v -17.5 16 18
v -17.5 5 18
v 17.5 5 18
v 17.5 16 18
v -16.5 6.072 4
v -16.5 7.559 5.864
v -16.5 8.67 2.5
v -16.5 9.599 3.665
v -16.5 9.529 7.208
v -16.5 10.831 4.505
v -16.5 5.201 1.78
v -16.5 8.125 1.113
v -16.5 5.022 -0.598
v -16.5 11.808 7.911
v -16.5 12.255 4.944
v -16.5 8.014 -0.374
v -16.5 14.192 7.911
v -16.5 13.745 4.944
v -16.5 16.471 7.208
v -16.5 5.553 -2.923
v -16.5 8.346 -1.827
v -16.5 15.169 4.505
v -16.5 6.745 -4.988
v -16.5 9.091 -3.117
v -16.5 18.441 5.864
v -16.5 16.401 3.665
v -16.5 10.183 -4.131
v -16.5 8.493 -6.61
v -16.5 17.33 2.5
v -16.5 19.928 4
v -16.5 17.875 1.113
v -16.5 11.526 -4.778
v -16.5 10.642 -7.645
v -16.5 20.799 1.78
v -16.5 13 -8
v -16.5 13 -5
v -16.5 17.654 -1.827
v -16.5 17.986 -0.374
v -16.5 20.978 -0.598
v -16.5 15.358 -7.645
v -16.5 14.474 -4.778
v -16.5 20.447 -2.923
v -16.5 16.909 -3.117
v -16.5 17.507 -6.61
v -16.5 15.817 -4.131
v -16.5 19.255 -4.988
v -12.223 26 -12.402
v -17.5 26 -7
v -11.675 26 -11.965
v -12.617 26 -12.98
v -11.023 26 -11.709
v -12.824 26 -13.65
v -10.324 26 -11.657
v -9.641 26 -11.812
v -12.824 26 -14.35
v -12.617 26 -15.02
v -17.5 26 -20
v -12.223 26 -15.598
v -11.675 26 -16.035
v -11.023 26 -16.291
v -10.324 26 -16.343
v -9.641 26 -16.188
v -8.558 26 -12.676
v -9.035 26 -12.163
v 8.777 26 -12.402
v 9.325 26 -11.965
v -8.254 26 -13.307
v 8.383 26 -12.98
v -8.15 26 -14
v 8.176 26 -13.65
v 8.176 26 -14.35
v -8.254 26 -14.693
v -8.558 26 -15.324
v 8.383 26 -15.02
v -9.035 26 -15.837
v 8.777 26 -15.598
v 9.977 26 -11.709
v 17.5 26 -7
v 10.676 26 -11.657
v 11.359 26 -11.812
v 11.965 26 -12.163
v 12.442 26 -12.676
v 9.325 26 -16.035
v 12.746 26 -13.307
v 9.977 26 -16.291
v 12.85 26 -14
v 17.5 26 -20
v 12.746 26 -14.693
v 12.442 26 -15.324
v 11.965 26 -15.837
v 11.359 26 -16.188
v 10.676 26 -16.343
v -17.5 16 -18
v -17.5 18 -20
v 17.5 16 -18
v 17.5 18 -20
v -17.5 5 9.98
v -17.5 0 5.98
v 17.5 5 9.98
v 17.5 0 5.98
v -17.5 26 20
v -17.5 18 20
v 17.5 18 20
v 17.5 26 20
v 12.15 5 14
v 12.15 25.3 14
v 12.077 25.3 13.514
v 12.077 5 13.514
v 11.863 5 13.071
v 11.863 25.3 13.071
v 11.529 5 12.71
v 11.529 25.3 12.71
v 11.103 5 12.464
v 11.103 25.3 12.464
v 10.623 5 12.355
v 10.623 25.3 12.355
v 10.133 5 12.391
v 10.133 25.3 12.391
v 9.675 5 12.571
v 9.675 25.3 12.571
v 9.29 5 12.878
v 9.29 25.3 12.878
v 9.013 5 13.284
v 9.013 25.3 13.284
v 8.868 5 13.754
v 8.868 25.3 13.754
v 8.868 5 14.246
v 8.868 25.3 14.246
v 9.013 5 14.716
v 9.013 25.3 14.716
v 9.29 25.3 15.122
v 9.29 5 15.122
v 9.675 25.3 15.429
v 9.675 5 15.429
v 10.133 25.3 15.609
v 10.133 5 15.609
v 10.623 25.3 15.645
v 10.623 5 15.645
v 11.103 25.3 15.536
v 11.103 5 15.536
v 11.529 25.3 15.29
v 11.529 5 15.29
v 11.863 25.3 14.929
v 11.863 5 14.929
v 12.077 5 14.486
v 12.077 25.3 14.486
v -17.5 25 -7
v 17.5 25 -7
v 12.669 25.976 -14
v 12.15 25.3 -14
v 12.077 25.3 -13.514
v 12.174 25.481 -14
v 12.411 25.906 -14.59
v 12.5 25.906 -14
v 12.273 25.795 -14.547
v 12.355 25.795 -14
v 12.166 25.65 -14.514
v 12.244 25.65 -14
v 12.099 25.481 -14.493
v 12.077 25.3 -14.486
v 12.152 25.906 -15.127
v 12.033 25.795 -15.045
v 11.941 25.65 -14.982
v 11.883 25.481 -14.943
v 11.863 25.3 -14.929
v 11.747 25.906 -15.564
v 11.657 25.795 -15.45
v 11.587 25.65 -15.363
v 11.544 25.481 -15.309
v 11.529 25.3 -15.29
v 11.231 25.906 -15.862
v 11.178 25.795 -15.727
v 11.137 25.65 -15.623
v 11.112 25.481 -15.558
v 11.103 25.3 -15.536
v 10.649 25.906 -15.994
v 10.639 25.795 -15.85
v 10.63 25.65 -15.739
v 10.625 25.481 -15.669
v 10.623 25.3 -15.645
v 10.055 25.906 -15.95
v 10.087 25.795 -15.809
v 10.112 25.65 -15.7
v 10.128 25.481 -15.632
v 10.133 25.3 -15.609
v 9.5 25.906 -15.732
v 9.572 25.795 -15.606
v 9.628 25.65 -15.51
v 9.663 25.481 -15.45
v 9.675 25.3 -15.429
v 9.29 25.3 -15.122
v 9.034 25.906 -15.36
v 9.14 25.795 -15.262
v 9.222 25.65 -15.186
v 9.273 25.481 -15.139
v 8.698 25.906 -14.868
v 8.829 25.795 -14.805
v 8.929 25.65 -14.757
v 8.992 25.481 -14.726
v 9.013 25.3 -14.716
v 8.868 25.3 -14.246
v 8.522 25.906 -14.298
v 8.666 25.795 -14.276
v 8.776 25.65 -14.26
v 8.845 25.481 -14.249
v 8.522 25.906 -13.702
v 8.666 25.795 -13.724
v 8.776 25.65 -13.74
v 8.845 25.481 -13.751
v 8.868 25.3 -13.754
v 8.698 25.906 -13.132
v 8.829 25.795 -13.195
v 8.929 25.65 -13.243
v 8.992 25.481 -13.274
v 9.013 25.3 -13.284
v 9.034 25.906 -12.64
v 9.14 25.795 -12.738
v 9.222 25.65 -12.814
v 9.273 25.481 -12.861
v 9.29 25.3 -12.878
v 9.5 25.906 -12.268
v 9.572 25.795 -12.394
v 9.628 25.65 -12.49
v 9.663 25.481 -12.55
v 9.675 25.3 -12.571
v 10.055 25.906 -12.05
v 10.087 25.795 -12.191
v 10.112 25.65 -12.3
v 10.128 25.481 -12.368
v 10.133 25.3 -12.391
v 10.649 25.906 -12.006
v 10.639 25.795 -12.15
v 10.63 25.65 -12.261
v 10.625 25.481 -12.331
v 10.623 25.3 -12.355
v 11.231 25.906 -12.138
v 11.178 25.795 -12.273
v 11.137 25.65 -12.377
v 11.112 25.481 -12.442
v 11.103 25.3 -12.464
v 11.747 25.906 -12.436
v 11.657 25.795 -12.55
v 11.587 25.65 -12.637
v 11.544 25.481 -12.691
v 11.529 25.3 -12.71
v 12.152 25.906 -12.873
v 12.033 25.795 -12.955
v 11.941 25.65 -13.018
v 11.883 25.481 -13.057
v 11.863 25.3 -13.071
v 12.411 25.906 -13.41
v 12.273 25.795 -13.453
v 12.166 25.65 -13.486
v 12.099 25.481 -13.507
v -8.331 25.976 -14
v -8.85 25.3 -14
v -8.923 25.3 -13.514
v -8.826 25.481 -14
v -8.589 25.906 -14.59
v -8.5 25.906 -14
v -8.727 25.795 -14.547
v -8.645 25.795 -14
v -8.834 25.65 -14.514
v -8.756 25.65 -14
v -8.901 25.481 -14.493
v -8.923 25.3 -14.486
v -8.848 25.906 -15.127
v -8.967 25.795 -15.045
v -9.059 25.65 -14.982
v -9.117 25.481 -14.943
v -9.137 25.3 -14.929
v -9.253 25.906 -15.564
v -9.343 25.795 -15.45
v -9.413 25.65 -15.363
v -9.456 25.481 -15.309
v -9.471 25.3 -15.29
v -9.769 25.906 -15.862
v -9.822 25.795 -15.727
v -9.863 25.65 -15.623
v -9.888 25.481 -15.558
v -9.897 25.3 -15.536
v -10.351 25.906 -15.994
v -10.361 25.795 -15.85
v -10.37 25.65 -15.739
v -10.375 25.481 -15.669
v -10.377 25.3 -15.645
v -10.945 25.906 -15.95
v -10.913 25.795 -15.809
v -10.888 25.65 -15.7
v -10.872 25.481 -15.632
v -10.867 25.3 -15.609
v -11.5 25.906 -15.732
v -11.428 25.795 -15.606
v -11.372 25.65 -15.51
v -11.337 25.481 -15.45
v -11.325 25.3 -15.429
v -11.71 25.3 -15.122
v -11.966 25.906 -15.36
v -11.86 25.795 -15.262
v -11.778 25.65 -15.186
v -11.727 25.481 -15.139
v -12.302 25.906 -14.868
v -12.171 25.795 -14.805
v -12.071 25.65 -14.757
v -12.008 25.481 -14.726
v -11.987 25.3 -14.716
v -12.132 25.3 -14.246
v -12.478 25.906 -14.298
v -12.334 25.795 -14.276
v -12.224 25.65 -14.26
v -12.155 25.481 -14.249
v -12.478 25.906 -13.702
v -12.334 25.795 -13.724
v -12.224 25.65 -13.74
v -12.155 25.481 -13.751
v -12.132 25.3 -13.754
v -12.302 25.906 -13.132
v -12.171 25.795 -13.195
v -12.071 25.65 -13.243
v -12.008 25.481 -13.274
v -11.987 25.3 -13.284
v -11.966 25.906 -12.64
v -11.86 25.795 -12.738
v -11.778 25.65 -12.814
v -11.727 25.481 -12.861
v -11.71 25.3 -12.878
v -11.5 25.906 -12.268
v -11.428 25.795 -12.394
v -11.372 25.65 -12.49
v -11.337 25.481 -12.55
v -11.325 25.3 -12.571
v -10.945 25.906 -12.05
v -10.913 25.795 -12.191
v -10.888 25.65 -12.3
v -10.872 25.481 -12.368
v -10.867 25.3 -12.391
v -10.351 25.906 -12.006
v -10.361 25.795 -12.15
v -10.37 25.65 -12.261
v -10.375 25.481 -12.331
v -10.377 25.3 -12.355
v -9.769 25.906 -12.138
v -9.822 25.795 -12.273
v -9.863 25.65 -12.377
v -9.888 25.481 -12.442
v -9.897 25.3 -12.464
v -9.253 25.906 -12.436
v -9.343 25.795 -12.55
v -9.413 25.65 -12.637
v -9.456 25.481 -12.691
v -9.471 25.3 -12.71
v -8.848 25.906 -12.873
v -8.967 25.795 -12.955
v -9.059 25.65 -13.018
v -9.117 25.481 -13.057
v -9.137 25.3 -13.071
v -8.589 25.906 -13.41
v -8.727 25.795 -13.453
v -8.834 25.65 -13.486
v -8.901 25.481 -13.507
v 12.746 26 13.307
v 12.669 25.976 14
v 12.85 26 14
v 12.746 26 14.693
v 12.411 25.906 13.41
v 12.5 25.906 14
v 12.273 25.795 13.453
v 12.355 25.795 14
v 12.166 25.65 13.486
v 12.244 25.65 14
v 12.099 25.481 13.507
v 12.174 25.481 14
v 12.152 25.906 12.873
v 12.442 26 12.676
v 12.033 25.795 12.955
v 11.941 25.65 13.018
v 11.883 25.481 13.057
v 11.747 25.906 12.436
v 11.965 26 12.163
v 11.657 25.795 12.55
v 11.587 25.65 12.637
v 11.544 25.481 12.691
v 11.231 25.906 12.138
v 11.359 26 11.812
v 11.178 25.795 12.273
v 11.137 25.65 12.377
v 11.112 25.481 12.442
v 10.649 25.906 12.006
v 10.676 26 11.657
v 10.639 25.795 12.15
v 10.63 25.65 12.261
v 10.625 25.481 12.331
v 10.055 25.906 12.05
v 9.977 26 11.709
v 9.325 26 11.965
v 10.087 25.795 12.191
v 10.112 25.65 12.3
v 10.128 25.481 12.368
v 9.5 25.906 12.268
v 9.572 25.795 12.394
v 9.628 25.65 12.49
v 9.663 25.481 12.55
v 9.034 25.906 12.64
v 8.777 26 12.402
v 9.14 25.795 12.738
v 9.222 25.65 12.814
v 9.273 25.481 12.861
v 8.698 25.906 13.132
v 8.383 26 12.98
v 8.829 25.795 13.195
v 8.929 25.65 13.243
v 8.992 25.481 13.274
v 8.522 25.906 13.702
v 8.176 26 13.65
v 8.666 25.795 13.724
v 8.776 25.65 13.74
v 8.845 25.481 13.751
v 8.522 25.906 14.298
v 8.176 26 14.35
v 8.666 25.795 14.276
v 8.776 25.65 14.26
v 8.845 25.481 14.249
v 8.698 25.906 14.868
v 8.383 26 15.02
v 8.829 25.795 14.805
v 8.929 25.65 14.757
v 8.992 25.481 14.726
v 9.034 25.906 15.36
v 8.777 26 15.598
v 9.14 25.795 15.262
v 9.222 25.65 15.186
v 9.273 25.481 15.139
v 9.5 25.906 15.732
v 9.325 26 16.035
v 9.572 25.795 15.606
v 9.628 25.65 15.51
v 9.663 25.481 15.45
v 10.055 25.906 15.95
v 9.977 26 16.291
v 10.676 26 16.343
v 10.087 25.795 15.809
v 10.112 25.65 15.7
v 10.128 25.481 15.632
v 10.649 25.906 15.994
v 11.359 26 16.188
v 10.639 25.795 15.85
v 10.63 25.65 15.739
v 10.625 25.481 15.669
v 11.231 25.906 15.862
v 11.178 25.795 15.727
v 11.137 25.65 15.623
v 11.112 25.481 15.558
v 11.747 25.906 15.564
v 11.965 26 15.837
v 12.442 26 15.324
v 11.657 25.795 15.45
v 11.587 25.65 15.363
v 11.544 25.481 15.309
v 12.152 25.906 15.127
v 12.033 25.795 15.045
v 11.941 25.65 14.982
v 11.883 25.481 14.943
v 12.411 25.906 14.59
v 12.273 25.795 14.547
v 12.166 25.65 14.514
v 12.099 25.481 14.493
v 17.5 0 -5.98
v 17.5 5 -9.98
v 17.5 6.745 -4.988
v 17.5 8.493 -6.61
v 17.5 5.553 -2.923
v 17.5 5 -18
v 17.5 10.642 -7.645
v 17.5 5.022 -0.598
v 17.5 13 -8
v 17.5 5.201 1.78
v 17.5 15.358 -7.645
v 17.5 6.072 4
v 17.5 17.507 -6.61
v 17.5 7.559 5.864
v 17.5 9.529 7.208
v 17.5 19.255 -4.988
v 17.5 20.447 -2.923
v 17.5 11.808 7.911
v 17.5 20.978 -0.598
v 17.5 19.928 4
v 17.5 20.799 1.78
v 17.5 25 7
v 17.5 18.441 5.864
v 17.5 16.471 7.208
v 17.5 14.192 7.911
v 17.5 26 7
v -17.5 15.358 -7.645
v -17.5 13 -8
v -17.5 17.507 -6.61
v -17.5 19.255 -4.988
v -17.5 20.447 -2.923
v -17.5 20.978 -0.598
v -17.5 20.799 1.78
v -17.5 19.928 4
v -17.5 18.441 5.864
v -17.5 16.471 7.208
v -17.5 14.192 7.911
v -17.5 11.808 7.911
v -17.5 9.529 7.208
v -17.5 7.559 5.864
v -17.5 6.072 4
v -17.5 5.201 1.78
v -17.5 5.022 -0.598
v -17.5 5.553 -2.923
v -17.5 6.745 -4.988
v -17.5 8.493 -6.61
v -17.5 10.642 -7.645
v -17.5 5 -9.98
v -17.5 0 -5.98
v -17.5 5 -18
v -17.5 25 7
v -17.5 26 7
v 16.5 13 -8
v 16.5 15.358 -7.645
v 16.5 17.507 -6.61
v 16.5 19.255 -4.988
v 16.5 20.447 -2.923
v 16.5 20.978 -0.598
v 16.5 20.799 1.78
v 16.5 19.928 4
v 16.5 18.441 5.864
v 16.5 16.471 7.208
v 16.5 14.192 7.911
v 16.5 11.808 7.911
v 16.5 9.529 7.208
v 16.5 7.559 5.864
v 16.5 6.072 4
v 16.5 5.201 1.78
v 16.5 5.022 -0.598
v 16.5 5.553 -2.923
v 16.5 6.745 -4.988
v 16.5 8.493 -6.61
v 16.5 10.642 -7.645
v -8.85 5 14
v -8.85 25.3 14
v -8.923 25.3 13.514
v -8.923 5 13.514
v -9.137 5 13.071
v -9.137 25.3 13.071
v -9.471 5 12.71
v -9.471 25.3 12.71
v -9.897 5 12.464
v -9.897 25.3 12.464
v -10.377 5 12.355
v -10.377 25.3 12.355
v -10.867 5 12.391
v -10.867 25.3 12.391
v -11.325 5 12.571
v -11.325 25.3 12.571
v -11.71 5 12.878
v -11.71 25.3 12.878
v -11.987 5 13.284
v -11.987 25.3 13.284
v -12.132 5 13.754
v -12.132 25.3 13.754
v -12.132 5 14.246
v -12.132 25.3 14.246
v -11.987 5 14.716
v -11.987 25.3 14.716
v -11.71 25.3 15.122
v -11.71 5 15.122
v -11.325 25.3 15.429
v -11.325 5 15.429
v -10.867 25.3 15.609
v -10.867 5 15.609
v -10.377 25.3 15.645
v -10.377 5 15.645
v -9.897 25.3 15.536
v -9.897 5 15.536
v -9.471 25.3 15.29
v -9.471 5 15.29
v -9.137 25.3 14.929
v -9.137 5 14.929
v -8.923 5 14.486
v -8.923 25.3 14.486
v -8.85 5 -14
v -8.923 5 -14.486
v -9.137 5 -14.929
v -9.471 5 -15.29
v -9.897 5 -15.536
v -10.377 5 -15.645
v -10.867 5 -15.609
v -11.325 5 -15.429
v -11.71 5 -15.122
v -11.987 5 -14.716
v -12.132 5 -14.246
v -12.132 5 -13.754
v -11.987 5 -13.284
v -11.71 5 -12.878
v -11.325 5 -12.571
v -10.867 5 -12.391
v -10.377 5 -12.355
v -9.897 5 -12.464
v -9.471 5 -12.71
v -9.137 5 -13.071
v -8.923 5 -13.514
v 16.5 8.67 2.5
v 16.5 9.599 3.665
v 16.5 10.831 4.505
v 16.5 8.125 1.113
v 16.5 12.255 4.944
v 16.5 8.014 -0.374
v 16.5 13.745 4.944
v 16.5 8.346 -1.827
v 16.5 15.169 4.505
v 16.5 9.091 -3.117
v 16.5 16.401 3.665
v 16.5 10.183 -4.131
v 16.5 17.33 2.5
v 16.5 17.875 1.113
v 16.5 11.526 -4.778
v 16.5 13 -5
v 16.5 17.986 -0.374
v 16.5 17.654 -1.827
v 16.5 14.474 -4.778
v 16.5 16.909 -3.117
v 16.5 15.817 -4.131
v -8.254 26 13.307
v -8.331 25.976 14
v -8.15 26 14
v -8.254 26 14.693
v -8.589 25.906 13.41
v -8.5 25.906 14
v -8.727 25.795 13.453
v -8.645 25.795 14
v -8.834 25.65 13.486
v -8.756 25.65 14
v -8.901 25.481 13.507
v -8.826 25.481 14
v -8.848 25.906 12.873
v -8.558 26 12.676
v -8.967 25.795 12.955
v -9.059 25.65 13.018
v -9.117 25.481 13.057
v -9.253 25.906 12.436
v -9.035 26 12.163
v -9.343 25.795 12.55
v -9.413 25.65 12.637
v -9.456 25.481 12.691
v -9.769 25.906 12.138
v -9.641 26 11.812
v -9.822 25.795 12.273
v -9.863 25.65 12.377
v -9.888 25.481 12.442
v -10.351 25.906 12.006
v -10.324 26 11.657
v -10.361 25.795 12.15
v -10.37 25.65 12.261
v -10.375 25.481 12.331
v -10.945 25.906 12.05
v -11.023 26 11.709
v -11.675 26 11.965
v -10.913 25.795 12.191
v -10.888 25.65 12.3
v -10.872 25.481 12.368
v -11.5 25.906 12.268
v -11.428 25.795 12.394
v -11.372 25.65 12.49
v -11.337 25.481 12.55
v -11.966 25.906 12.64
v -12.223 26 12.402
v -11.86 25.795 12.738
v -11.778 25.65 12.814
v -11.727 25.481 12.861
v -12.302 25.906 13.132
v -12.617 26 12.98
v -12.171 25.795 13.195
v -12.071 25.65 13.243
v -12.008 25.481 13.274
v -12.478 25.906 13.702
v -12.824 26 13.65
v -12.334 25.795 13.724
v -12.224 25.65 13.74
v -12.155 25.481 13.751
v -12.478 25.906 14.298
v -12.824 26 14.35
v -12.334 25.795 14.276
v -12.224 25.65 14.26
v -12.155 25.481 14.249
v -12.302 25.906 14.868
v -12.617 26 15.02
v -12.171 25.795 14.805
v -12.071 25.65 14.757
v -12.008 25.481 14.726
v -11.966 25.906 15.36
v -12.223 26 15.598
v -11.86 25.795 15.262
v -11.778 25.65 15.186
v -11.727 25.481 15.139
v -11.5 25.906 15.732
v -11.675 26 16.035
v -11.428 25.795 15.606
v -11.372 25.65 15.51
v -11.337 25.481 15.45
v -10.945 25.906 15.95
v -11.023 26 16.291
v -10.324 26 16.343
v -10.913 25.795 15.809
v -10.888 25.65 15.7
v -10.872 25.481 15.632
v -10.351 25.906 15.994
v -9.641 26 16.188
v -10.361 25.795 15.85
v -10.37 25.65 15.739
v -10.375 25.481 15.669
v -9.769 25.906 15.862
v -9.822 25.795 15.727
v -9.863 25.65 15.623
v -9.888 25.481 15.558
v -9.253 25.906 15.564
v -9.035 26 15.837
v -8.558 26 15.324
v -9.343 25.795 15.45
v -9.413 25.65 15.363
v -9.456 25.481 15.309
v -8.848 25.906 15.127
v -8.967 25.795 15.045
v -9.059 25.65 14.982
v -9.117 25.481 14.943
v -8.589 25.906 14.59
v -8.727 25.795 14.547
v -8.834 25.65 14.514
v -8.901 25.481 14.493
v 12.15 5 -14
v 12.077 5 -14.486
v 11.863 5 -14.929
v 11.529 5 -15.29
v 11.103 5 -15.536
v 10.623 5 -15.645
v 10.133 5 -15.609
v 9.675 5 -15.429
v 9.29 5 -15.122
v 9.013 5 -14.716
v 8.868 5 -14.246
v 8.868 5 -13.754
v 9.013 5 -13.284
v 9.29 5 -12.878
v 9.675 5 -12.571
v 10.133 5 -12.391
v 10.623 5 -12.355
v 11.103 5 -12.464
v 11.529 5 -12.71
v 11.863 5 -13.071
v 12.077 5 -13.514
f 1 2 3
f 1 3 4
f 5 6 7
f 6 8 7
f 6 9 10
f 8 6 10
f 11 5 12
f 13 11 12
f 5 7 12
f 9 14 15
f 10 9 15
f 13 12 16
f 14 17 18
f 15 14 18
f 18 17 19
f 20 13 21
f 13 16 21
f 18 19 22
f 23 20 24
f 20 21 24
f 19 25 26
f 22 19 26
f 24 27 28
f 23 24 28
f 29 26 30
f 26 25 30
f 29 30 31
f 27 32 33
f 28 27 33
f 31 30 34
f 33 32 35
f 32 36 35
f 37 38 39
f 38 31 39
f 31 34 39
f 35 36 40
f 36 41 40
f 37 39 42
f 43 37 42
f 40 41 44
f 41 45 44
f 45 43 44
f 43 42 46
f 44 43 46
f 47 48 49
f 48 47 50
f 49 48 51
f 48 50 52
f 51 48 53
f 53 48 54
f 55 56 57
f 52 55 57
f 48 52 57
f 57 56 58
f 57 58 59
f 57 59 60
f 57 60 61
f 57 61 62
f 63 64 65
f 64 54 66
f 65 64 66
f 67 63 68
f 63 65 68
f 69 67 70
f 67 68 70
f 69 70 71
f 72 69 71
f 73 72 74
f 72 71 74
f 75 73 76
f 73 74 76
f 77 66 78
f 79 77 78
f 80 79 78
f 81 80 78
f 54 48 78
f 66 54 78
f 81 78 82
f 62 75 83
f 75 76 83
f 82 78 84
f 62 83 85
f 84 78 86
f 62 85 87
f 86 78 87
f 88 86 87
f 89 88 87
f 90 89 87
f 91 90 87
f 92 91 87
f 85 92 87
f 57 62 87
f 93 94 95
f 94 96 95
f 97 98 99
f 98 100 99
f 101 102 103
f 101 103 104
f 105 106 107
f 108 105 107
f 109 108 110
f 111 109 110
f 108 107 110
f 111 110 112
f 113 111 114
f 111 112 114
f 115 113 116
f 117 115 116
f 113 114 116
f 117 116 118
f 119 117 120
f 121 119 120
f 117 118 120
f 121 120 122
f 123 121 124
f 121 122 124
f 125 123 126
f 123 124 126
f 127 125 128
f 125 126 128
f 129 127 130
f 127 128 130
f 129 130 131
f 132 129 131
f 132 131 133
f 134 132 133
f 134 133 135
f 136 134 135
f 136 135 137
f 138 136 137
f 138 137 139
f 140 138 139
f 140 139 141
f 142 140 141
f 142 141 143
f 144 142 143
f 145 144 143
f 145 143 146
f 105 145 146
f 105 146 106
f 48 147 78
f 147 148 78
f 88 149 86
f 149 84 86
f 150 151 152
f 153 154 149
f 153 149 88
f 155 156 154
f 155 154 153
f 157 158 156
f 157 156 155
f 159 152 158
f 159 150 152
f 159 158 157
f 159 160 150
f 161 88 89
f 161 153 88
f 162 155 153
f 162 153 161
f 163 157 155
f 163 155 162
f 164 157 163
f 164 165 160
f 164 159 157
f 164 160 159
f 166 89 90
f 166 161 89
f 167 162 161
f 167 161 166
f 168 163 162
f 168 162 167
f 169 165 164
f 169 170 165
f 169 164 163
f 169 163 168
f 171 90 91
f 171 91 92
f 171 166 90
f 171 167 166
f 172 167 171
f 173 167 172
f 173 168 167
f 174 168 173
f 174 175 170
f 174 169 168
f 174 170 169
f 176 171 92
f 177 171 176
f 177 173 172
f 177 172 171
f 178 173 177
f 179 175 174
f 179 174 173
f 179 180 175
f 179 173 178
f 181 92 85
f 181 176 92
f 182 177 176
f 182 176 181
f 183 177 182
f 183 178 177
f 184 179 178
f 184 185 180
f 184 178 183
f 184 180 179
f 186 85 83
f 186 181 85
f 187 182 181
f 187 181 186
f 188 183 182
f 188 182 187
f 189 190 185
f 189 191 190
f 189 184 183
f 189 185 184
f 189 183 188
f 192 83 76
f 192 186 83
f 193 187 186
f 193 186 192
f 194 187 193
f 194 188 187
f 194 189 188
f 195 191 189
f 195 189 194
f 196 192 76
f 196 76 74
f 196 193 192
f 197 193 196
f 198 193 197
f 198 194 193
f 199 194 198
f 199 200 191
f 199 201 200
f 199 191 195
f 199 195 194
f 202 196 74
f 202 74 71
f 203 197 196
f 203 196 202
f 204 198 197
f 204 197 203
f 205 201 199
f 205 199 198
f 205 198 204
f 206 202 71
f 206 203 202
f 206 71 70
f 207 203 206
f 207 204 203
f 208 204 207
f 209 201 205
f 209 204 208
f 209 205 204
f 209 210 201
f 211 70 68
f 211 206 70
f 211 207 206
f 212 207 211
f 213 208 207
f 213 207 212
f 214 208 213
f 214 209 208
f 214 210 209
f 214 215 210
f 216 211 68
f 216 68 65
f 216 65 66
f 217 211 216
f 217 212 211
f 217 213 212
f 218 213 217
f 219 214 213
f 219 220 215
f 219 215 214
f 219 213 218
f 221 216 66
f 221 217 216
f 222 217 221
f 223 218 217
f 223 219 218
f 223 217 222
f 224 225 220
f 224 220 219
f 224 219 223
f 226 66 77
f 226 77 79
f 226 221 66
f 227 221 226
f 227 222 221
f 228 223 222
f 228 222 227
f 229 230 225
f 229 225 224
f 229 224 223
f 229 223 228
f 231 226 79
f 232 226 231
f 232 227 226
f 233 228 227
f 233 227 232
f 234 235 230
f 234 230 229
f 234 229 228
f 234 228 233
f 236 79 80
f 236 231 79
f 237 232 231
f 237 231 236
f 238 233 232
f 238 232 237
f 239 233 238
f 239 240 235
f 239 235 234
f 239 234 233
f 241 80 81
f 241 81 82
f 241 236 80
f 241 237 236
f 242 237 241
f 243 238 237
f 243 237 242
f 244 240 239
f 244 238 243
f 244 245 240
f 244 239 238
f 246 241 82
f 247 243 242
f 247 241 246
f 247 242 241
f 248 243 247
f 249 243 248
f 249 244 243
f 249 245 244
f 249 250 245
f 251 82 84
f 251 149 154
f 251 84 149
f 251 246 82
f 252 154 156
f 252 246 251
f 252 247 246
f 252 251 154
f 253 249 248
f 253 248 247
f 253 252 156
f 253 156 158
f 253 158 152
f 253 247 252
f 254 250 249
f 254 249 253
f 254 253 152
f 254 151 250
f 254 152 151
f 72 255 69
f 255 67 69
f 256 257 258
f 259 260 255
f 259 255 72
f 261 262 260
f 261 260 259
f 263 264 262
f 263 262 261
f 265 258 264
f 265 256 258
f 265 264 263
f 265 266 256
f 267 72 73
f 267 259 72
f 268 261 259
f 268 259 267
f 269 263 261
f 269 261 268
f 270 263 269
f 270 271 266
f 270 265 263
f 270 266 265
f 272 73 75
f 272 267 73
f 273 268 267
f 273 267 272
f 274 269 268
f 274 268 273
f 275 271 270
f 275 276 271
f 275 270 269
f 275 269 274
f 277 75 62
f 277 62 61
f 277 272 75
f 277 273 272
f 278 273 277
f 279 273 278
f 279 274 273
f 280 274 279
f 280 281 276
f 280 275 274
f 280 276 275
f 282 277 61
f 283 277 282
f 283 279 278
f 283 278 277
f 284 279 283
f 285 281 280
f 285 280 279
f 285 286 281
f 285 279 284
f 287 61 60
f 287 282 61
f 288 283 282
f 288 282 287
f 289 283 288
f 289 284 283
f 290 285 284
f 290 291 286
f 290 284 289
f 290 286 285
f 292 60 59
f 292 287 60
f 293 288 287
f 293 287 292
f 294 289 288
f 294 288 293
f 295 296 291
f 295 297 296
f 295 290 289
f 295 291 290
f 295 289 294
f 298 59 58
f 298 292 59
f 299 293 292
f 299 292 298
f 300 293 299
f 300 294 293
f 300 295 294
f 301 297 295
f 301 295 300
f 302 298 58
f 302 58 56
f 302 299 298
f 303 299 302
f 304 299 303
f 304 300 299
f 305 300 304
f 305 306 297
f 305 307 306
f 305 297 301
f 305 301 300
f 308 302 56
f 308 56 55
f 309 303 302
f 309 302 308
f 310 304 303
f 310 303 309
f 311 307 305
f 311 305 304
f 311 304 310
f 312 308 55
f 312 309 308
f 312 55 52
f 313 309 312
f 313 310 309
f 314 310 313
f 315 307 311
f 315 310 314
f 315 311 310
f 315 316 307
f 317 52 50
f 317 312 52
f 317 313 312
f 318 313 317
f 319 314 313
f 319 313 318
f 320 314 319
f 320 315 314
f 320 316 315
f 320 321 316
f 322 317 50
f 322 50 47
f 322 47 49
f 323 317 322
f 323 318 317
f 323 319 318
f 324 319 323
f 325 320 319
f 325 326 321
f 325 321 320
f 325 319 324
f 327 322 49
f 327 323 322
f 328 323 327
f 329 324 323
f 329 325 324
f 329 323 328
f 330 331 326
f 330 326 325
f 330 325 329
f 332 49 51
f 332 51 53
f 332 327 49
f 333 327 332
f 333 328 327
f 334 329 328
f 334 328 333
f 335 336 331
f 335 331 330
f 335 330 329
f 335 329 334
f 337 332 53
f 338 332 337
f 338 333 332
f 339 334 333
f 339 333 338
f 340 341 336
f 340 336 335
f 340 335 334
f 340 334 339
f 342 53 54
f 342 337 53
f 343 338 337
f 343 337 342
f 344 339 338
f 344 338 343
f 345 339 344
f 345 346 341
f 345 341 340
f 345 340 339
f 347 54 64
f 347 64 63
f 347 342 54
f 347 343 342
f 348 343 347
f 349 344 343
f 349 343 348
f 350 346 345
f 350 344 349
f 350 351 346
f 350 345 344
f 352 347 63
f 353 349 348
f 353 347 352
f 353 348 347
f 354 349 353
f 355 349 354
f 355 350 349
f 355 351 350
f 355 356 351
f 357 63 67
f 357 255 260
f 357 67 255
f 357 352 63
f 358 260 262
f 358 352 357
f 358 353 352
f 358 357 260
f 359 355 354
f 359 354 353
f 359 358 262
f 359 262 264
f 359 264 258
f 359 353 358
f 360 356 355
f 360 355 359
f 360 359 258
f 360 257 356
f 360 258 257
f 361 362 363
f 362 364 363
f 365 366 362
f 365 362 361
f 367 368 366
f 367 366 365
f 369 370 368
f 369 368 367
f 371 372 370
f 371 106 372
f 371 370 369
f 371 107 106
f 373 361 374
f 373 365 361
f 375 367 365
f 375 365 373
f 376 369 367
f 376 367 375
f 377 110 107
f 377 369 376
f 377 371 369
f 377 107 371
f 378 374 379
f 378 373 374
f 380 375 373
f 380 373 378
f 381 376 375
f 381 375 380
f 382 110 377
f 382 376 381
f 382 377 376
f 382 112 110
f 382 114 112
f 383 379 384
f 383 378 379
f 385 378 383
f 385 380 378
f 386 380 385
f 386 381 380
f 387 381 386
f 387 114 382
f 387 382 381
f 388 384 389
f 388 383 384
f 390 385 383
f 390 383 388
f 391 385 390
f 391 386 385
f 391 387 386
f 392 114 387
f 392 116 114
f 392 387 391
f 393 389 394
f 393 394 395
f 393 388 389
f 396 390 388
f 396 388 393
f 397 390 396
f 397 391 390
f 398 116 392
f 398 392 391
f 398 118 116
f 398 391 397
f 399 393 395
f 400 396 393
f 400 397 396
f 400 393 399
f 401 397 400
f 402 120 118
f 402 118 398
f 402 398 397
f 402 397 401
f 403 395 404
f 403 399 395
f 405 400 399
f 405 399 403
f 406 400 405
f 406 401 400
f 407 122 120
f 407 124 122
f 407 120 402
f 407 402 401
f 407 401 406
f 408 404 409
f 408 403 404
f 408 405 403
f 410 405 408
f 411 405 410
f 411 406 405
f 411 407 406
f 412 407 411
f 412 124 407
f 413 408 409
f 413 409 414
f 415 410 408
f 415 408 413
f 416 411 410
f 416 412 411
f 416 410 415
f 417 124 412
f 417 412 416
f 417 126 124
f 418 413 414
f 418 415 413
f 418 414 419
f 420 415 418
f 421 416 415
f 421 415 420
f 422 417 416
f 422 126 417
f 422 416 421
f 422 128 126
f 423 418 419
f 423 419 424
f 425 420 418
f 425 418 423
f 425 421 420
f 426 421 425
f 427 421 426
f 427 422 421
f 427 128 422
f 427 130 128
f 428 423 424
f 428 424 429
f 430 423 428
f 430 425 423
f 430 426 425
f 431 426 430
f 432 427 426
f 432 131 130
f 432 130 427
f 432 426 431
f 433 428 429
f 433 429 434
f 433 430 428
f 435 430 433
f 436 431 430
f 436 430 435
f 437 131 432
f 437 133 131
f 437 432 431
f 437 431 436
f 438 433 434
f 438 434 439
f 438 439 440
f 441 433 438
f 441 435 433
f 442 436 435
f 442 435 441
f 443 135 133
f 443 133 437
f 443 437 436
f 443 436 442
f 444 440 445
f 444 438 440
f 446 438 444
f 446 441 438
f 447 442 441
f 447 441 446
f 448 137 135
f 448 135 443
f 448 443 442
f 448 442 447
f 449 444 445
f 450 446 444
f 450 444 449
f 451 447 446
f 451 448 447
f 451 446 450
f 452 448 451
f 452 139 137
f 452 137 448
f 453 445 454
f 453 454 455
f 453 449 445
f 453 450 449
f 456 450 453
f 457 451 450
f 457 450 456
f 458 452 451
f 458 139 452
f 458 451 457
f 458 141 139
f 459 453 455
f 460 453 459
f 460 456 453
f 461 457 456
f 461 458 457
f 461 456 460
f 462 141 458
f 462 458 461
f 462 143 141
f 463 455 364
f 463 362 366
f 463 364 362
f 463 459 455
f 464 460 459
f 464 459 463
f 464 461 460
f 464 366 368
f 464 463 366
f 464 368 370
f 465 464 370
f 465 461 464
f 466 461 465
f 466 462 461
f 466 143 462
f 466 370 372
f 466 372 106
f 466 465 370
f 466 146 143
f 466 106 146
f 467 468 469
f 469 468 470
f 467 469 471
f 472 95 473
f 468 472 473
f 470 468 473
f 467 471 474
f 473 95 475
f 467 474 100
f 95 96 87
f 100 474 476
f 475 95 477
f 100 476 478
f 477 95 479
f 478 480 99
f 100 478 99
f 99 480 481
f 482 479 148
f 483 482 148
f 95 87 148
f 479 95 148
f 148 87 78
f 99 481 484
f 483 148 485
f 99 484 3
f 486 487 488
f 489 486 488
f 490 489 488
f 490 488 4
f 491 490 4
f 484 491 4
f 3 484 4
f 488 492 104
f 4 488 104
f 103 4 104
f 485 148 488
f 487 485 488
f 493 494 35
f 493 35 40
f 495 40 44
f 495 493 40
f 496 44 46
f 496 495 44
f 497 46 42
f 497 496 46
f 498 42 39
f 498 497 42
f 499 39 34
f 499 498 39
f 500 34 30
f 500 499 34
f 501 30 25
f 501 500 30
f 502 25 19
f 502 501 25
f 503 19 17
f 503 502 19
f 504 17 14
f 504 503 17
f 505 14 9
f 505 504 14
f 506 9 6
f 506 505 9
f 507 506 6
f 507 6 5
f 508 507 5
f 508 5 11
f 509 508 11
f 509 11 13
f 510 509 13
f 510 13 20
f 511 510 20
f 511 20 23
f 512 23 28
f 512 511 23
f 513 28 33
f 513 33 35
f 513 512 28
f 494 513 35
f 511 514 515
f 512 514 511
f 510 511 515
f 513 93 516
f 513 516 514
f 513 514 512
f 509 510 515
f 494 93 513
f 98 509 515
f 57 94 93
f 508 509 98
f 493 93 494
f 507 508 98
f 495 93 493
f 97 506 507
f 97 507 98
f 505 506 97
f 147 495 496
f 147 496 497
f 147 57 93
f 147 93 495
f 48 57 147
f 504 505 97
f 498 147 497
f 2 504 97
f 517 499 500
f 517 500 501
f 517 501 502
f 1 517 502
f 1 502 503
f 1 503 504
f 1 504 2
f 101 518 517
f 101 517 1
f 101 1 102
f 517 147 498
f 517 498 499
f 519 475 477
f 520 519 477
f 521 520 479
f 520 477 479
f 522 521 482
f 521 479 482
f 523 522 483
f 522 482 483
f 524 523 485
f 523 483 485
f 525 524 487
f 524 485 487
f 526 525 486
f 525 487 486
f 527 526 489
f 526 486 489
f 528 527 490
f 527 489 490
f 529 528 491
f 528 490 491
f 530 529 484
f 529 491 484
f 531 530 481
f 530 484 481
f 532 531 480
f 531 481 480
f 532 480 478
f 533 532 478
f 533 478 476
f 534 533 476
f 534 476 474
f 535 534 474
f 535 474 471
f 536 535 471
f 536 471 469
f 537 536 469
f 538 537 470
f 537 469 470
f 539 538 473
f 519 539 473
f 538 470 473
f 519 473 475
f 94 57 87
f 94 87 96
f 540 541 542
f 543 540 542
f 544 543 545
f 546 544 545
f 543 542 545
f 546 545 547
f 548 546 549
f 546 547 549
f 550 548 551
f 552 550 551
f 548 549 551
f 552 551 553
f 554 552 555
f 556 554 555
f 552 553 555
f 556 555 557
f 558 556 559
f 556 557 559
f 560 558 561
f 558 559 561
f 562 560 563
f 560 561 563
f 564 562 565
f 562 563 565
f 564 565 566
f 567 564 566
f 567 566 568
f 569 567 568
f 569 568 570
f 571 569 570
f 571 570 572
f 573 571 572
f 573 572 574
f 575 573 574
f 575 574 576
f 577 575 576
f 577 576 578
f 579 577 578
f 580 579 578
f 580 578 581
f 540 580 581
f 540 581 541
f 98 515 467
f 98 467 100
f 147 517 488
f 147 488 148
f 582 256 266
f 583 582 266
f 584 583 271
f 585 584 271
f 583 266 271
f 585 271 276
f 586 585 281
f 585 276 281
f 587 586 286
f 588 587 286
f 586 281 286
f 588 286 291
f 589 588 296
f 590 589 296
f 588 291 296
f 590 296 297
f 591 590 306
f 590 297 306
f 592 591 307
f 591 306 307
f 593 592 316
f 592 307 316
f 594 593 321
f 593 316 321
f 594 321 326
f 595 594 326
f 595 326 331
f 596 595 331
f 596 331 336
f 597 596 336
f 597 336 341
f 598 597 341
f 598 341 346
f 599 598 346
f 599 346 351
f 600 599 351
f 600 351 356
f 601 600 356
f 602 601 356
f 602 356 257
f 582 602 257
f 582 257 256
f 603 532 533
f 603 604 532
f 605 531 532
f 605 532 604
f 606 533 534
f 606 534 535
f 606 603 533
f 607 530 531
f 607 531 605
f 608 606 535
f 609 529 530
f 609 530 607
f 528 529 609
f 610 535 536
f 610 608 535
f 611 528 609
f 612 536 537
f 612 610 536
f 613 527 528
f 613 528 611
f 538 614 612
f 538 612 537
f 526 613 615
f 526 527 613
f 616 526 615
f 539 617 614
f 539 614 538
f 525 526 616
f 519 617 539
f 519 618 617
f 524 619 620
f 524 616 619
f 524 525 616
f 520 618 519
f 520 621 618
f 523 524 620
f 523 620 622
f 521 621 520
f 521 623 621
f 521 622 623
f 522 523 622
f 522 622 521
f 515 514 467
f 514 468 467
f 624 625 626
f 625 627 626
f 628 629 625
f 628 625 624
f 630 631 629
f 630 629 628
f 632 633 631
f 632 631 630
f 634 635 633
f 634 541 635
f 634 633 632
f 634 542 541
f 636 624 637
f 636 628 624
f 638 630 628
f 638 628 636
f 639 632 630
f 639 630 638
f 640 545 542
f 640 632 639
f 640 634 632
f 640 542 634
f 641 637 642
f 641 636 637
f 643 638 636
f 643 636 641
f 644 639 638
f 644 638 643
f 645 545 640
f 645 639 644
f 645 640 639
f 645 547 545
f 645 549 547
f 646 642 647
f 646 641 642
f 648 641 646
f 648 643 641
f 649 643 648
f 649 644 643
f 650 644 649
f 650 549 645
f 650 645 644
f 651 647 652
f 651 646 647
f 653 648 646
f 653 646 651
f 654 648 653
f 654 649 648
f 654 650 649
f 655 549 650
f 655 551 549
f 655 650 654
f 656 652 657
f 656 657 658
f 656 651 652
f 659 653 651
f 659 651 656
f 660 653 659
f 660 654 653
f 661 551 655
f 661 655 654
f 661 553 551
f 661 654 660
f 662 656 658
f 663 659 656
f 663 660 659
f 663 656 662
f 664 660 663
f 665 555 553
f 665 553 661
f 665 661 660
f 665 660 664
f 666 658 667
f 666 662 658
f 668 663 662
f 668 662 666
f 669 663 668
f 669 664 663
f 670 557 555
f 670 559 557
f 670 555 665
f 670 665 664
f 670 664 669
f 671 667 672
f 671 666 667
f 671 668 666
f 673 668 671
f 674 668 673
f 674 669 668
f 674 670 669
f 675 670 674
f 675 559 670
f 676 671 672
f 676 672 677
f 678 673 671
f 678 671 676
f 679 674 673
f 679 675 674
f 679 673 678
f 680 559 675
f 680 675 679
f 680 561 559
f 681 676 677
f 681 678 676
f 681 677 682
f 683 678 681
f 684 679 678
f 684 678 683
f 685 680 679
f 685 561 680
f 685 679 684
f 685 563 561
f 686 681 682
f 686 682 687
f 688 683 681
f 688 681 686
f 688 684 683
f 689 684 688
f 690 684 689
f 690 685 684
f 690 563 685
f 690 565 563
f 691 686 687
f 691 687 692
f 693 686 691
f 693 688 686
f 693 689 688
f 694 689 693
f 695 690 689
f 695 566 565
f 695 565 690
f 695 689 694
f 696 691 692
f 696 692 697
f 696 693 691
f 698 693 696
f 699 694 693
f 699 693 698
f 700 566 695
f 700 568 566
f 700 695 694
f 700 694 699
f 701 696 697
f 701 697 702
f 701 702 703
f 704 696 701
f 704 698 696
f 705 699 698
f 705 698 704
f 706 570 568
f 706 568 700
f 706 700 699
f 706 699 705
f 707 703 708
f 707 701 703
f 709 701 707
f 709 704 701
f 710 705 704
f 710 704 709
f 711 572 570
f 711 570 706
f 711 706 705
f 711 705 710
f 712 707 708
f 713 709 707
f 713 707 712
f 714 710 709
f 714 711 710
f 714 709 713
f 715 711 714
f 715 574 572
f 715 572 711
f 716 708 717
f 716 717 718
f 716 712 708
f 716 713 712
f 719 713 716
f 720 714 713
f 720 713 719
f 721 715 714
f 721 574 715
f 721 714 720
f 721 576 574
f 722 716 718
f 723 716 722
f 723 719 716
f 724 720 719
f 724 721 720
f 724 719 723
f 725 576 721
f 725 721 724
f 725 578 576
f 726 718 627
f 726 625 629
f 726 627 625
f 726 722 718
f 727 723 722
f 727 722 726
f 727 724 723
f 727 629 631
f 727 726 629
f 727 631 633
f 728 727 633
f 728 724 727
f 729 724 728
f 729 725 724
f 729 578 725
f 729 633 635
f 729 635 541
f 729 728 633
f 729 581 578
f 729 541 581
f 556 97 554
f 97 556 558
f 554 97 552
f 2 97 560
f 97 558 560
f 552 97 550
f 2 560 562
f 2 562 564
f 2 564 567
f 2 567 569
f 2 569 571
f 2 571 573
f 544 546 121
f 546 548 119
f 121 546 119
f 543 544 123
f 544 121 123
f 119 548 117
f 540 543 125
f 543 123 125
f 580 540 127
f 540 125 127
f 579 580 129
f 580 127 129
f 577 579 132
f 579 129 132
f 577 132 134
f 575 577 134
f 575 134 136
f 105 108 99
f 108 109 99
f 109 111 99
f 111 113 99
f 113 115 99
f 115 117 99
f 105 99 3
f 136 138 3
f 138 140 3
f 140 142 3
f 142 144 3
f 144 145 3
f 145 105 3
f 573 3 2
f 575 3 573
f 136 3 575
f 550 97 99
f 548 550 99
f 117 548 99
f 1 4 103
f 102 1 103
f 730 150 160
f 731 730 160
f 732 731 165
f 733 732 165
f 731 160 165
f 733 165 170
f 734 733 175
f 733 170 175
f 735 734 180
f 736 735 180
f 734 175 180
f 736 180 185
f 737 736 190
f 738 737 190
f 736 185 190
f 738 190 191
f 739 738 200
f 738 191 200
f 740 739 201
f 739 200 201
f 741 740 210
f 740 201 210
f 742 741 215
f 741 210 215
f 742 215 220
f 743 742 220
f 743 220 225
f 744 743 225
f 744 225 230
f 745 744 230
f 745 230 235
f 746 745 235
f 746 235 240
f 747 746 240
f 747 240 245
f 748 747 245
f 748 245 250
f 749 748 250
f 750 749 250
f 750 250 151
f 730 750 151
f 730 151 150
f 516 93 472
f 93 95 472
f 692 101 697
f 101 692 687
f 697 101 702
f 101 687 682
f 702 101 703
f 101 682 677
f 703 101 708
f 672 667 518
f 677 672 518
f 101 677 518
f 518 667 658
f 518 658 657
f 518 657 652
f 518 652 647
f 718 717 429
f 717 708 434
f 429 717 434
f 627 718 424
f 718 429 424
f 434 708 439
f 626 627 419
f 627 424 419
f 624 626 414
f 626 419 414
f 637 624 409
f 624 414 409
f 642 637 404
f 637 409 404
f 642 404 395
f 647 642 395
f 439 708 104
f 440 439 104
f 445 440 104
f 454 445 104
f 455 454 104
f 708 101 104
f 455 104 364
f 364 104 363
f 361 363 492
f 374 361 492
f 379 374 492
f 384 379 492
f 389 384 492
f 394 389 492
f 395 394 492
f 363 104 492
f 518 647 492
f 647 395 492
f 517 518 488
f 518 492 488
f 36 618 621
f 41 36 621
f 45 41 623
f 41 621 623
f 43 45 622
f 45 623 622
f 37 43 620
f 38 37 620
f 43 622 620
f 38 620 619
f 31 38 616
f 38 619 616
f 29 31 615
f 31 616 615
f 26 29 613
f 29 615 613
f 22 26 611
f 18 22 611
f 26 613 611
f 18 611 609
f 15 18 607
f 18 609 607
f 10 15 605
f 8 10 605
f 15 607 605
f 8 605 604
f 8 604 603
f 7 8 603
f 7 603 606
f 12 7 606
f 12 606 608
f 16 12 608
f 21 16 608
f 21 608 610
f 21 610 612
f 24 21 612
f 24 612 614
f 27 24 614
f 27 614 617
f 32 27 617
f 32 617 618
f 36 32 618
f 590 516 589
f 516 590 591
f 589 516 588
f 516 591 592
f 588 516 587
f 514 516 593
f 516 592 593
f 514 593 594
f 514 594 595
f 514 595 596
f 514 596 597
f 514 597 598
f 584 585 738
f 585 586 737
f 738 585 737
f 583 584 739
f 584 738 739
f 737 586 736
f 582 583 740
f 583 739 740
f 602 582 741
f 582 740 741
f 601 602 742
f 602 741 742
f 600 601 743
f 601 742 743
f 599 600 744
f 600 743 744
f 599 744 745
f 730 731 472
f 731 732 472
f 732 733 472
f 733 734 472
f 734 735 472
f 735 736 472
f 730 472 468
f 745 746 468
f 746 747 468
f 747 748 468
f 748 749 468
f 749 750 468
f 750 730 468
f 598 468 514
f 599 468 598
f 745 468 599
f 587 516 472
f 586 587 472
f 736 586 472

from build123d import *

# Parameters (mm, degrees)
BOSS_EXTRUDE1_DEPTH = 17.5
SKETCH2_R           = 5
CUT_EXTRUDE1_DEPTH  = 36
SKETCH3_R           = 1.65
CUT_EXTRUDE2_DEPTH  = 27
FILLET1_R           = 0.7
SKETCH8_R           = 8
CUT_EXTRUDE5_DEPTH  = 1


with BuildPart() as part:
    # Sketch1 → Boss-Extrude1 (new body, symmetric)
    with BuildSketch(Plane(origin=(0, 0, 0), x_dir=(0, 0, -1), z_dir=(1, 0, 0))):
        Polygon((-20, 26), (-7, 26), (-7, 25), (7, 25), (7, 26), (20, 26), (20, 18), (18, 16), (18, 5), (9.980120734, 5), (5.980120734, 0), (-5.980120734, 0), (-9.980120734, 5), (-18, 5), (-18, 16), (-20, 18), align=None)
    extrude(amount=BOSS_EXTRUDE1_DEPTH, both=True)

    # Sketch2 → Cut-Extrude1 (cut, through all)
    with BuildSketch(Plane(origin=(17.5, 0, 0), x_dir=(0, 0, -1), z_dir=(1, 0, 0))):
        with Locations((0, 13)):
            Circle(SKETCH2_R)
    extrude(amount=-CUT_EXTRUDE1_DEPTH, mode=Mode.SUBTRACT)

    # Sketch3 → Cut-Extrude2 (cut, through all)
    with BuildSketch(Plane(origin=(0, 26, 0), x_dir=(1, 0, 0), z_dir=(0, 1, 0))):
        with Locations((-10.5, 14)):
            Circle(SKETCH3_R)
        with Locations((10.5, 14)):
            Circle(SKETCH3_R)
        with Locations((10.5, -14)):
            Circle(SKETCH3_R)
        with Locations((-10.5, -14)):
            Circle(SKETCH3_R)
    extrude(amount=-CUT_EXTRUDE2_DEPTH, mode=Mode.SUBTRACT)

    # Fillet1
    fillet1_edges = [part.edges().sort_by_distance(p)[0] for p in [
        (-12.15, 26, -14),
        (8.85, 26, -14),
        (8.85, 26, 14),
        (-12.15, 26, 14),
    ]]
    fillet(fillet1_edges, radius=FILLET1_R)

    # Sketch8 → Cut-Extrude5 (cut)
    with BuildSketch(Plane(origin=(17.5, 0, 0), x_dir=(0, 0, -1), z_dir=(1, 0, 0))):
        with Locations((0, 13)):
            Circle(SKETCH8_R)
    cut_extrude5 = extrude(amount=-CUT_EXTRUDE5_DEPTH, mode=Mode.SUBTRACT)

    # Mirror3: Cut-Extrude5 across plane
    add(cut_extrude5.mirror(Plane(origin=(0, 0, 0), x_dir=(0, 0, 1), z_dir=(1, 0, 0))), mode=Mode.SUBTRACT)


solid = part.part
